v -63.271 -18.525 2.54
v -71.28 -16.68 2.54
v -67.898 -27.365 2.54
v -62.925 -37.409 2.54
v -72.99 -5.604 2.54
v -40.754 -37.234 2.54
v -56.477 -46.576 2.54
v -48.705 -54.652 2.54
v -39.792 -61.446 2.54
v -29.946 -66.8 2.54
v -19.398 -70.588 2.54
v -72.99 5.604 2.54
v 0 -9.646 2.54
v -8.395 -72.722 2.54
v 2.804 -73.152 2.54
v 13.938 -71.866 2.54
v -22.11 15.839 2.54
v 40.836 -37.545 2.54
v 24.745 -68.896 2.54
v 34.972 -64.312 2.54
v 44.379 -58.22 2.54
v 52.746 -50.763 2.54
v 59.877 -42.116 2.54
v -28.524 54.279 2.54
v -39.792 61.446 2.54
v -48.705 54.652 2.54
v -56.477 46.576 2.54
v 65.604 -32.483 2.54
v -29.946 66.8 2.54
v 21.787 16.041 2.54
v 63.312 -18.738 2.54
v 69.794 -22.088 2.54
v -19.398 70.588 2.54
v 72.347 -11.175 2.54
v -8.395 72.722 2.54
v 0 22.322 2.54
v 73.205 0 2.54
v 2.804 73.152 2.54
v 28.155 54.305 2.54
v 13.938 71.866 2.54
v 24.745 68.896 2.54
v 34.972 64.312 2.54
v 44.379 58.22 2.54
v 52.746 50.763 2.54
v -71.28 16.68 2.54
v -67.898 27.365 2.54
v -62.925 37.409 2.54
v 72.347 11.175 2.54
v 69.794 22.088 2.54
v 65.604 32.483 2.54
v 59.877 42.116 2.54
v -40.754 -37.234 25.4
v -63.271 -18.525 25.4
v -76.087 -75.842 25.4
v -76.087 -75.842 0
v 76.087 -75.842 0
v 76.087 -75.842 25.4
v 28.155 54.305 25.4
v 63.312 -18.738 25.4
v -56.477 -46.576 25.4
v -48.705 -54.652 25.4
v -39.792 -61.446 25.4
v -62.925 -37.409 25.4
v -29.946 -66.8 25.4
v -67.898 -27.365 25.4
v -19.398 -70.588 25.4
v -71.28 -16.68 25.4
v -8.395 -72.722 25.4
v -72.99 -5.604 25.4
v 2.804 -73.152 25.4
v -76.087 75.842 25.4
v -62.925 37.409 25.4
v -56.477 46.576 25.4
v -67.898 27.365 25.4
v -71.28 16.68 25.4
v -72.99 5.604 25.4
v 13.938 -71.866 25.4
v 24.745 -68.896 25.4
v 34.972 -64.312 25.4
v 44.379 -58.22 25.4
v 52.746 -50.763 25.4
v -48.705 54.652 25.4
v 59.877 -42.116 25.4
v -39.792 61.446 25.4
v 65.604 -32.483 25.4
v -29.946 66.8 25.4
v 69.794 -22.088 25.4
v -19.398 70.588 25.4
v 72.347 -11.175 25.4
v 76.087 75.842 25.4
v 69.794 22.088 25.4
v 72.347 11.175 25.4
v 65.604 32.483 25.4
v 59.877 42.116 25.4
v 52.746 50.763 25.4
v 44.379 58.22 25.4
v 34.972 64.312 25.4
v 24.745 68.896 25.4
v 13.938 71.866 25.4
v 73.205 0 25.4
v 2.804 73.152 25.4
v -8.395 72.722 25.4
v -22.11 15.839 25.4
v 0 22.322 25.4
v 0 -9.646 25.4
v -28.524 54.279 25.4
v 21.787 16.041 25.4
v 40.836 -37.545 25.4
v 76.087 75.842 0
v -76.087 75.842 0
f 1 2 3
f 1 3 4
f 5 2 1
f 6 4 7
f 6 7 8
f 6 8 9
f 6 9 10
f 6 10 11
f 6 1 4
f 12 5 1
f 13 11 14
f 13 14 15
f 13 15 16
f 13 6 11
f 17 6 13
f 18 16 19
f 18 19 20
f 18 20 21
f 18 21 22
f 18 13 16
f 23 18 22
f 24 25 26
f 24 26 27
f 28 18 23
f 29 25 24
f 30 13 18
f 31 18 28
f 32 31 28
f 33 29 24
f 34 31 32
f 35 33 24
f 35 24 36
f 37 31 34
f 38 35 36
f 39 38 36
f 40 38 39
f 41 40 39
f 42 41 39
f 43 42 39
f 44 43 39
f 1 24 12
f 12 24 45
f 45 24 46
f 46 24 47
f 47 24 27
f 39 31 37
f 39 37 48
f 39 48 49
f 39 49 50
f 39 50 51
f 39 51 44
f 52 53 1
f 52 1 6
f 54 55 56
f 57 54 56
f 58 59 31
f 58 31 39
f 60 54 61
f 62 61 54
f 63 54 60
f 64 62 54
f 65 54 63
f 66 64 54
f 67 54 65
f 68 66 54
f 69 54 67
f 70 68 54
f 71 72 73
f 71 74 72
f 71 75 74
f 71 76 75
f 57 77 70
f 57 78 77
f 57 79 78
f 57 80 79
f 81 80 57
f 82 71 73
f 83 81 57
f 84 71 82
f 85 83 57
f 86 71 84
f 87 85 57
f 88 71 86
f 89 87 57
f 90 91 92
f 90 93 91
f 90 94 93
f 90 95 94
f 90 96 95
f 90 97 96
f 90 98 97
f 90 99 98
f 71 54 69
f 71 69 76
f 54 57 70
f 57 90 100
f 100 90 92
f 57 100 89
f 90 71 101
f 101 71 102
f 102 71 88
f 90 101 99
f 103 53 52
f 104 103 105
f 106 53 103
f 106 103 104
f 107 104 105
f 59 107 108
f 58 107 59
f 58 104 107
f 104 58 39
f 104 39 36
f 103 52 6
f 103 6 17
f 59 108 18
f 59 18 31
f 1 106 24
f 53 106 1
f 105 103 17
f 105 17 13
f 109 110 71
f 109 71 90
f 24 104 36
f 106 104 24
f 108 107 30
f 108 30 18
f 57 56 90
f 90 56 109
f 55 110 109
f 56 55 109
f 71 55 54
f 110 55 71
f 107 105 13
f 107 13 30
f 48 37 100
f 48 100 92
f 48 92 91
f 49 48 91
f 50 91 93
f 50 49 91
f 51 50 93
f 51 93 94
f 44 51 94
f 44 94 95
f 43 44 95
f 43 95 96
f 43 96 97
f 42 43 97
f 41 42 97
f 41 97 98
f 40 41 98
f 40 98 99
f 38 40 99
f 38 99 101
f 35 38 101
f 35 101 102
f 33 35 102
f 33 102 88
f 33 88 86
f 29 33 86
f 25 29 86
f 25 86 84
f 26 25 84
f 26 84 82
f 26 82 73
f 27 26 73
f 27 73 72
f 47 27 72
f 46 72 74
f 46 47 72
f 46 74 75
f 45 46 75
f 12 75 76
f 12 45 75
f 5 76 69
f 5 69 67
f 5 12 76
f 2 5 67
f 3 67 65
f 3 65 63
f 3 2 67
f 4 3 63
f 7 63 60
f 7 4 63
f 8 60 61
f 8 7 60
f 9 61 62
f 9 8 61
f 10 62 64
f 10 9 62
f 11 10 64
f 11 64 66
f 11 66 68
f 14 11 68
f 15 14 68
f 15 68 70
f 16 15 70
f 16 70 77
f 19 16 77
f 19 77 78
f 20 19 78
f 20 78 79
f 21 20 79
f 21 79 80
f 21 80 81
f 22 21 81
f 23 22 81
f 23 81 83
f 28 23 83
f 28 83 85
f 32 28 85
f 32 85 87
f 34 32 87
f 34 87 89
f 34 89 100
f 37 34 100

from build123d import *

# Parameters (mm, degrees)
F0_R     = 73.2052384523
F1_DEPTH = 2.54
F0_W     = 152.1742939949
F0_H     = 151.6839265823
F2_DEPTH = 25.4
F4_DEPTH = 25.4


with BuildPart() as f1:
    # F0 (on Top) → F1 (new body)
    with BuildSketch(Plane.XY):
        Circle(F0_R)
        Polygon((-40.7538563013, -37.2341535985), (-63.2713064551, -18.5253843665), (-28.52431871, 54.2785041034), (0, 22.3221629858), (28.1545463949, 54.3052591383), (63.3123517036, -18.7383014709), (40.8359244466, -37.5453457236), (21.7867922038, 16.0413701087), (0, -9.6461987123), (-22.1097543836, 15.8388335258), align=None, mode=Mode.SUBTRACT)
    extrude(amount=F1_DEPTH)

    # F0 (on Top) → F2 (join)
    with BuildSketch(Plane.XY):
        Rectangle(F0_W, F0_H)
        Circle(F0_R, mode=Mode.SUBTRACT)
    extrude(amount=F2_DEPTH)

    # F3 (on face) → F4 (join)
    with BuildSketch(Plane.XY.offset(25.4)):
        Polygon((-28.52431871, 54.2785041034), (-63.2713064551, -18.5253843665), (-40.7538563013, -37.2341535985), (-22.1097543836, 15.8388335258), (0, -9.6461987123), (21.7867922038, 16.0413701087), (40.8359244466, -37.5453457236), (63.3123517036, -18.7383014709), (28.1545463949, 54.3052591383), (0, 22.3221629858), align=None)
    extrude(amount=-F4_DEPTH)


solid = f1.part
